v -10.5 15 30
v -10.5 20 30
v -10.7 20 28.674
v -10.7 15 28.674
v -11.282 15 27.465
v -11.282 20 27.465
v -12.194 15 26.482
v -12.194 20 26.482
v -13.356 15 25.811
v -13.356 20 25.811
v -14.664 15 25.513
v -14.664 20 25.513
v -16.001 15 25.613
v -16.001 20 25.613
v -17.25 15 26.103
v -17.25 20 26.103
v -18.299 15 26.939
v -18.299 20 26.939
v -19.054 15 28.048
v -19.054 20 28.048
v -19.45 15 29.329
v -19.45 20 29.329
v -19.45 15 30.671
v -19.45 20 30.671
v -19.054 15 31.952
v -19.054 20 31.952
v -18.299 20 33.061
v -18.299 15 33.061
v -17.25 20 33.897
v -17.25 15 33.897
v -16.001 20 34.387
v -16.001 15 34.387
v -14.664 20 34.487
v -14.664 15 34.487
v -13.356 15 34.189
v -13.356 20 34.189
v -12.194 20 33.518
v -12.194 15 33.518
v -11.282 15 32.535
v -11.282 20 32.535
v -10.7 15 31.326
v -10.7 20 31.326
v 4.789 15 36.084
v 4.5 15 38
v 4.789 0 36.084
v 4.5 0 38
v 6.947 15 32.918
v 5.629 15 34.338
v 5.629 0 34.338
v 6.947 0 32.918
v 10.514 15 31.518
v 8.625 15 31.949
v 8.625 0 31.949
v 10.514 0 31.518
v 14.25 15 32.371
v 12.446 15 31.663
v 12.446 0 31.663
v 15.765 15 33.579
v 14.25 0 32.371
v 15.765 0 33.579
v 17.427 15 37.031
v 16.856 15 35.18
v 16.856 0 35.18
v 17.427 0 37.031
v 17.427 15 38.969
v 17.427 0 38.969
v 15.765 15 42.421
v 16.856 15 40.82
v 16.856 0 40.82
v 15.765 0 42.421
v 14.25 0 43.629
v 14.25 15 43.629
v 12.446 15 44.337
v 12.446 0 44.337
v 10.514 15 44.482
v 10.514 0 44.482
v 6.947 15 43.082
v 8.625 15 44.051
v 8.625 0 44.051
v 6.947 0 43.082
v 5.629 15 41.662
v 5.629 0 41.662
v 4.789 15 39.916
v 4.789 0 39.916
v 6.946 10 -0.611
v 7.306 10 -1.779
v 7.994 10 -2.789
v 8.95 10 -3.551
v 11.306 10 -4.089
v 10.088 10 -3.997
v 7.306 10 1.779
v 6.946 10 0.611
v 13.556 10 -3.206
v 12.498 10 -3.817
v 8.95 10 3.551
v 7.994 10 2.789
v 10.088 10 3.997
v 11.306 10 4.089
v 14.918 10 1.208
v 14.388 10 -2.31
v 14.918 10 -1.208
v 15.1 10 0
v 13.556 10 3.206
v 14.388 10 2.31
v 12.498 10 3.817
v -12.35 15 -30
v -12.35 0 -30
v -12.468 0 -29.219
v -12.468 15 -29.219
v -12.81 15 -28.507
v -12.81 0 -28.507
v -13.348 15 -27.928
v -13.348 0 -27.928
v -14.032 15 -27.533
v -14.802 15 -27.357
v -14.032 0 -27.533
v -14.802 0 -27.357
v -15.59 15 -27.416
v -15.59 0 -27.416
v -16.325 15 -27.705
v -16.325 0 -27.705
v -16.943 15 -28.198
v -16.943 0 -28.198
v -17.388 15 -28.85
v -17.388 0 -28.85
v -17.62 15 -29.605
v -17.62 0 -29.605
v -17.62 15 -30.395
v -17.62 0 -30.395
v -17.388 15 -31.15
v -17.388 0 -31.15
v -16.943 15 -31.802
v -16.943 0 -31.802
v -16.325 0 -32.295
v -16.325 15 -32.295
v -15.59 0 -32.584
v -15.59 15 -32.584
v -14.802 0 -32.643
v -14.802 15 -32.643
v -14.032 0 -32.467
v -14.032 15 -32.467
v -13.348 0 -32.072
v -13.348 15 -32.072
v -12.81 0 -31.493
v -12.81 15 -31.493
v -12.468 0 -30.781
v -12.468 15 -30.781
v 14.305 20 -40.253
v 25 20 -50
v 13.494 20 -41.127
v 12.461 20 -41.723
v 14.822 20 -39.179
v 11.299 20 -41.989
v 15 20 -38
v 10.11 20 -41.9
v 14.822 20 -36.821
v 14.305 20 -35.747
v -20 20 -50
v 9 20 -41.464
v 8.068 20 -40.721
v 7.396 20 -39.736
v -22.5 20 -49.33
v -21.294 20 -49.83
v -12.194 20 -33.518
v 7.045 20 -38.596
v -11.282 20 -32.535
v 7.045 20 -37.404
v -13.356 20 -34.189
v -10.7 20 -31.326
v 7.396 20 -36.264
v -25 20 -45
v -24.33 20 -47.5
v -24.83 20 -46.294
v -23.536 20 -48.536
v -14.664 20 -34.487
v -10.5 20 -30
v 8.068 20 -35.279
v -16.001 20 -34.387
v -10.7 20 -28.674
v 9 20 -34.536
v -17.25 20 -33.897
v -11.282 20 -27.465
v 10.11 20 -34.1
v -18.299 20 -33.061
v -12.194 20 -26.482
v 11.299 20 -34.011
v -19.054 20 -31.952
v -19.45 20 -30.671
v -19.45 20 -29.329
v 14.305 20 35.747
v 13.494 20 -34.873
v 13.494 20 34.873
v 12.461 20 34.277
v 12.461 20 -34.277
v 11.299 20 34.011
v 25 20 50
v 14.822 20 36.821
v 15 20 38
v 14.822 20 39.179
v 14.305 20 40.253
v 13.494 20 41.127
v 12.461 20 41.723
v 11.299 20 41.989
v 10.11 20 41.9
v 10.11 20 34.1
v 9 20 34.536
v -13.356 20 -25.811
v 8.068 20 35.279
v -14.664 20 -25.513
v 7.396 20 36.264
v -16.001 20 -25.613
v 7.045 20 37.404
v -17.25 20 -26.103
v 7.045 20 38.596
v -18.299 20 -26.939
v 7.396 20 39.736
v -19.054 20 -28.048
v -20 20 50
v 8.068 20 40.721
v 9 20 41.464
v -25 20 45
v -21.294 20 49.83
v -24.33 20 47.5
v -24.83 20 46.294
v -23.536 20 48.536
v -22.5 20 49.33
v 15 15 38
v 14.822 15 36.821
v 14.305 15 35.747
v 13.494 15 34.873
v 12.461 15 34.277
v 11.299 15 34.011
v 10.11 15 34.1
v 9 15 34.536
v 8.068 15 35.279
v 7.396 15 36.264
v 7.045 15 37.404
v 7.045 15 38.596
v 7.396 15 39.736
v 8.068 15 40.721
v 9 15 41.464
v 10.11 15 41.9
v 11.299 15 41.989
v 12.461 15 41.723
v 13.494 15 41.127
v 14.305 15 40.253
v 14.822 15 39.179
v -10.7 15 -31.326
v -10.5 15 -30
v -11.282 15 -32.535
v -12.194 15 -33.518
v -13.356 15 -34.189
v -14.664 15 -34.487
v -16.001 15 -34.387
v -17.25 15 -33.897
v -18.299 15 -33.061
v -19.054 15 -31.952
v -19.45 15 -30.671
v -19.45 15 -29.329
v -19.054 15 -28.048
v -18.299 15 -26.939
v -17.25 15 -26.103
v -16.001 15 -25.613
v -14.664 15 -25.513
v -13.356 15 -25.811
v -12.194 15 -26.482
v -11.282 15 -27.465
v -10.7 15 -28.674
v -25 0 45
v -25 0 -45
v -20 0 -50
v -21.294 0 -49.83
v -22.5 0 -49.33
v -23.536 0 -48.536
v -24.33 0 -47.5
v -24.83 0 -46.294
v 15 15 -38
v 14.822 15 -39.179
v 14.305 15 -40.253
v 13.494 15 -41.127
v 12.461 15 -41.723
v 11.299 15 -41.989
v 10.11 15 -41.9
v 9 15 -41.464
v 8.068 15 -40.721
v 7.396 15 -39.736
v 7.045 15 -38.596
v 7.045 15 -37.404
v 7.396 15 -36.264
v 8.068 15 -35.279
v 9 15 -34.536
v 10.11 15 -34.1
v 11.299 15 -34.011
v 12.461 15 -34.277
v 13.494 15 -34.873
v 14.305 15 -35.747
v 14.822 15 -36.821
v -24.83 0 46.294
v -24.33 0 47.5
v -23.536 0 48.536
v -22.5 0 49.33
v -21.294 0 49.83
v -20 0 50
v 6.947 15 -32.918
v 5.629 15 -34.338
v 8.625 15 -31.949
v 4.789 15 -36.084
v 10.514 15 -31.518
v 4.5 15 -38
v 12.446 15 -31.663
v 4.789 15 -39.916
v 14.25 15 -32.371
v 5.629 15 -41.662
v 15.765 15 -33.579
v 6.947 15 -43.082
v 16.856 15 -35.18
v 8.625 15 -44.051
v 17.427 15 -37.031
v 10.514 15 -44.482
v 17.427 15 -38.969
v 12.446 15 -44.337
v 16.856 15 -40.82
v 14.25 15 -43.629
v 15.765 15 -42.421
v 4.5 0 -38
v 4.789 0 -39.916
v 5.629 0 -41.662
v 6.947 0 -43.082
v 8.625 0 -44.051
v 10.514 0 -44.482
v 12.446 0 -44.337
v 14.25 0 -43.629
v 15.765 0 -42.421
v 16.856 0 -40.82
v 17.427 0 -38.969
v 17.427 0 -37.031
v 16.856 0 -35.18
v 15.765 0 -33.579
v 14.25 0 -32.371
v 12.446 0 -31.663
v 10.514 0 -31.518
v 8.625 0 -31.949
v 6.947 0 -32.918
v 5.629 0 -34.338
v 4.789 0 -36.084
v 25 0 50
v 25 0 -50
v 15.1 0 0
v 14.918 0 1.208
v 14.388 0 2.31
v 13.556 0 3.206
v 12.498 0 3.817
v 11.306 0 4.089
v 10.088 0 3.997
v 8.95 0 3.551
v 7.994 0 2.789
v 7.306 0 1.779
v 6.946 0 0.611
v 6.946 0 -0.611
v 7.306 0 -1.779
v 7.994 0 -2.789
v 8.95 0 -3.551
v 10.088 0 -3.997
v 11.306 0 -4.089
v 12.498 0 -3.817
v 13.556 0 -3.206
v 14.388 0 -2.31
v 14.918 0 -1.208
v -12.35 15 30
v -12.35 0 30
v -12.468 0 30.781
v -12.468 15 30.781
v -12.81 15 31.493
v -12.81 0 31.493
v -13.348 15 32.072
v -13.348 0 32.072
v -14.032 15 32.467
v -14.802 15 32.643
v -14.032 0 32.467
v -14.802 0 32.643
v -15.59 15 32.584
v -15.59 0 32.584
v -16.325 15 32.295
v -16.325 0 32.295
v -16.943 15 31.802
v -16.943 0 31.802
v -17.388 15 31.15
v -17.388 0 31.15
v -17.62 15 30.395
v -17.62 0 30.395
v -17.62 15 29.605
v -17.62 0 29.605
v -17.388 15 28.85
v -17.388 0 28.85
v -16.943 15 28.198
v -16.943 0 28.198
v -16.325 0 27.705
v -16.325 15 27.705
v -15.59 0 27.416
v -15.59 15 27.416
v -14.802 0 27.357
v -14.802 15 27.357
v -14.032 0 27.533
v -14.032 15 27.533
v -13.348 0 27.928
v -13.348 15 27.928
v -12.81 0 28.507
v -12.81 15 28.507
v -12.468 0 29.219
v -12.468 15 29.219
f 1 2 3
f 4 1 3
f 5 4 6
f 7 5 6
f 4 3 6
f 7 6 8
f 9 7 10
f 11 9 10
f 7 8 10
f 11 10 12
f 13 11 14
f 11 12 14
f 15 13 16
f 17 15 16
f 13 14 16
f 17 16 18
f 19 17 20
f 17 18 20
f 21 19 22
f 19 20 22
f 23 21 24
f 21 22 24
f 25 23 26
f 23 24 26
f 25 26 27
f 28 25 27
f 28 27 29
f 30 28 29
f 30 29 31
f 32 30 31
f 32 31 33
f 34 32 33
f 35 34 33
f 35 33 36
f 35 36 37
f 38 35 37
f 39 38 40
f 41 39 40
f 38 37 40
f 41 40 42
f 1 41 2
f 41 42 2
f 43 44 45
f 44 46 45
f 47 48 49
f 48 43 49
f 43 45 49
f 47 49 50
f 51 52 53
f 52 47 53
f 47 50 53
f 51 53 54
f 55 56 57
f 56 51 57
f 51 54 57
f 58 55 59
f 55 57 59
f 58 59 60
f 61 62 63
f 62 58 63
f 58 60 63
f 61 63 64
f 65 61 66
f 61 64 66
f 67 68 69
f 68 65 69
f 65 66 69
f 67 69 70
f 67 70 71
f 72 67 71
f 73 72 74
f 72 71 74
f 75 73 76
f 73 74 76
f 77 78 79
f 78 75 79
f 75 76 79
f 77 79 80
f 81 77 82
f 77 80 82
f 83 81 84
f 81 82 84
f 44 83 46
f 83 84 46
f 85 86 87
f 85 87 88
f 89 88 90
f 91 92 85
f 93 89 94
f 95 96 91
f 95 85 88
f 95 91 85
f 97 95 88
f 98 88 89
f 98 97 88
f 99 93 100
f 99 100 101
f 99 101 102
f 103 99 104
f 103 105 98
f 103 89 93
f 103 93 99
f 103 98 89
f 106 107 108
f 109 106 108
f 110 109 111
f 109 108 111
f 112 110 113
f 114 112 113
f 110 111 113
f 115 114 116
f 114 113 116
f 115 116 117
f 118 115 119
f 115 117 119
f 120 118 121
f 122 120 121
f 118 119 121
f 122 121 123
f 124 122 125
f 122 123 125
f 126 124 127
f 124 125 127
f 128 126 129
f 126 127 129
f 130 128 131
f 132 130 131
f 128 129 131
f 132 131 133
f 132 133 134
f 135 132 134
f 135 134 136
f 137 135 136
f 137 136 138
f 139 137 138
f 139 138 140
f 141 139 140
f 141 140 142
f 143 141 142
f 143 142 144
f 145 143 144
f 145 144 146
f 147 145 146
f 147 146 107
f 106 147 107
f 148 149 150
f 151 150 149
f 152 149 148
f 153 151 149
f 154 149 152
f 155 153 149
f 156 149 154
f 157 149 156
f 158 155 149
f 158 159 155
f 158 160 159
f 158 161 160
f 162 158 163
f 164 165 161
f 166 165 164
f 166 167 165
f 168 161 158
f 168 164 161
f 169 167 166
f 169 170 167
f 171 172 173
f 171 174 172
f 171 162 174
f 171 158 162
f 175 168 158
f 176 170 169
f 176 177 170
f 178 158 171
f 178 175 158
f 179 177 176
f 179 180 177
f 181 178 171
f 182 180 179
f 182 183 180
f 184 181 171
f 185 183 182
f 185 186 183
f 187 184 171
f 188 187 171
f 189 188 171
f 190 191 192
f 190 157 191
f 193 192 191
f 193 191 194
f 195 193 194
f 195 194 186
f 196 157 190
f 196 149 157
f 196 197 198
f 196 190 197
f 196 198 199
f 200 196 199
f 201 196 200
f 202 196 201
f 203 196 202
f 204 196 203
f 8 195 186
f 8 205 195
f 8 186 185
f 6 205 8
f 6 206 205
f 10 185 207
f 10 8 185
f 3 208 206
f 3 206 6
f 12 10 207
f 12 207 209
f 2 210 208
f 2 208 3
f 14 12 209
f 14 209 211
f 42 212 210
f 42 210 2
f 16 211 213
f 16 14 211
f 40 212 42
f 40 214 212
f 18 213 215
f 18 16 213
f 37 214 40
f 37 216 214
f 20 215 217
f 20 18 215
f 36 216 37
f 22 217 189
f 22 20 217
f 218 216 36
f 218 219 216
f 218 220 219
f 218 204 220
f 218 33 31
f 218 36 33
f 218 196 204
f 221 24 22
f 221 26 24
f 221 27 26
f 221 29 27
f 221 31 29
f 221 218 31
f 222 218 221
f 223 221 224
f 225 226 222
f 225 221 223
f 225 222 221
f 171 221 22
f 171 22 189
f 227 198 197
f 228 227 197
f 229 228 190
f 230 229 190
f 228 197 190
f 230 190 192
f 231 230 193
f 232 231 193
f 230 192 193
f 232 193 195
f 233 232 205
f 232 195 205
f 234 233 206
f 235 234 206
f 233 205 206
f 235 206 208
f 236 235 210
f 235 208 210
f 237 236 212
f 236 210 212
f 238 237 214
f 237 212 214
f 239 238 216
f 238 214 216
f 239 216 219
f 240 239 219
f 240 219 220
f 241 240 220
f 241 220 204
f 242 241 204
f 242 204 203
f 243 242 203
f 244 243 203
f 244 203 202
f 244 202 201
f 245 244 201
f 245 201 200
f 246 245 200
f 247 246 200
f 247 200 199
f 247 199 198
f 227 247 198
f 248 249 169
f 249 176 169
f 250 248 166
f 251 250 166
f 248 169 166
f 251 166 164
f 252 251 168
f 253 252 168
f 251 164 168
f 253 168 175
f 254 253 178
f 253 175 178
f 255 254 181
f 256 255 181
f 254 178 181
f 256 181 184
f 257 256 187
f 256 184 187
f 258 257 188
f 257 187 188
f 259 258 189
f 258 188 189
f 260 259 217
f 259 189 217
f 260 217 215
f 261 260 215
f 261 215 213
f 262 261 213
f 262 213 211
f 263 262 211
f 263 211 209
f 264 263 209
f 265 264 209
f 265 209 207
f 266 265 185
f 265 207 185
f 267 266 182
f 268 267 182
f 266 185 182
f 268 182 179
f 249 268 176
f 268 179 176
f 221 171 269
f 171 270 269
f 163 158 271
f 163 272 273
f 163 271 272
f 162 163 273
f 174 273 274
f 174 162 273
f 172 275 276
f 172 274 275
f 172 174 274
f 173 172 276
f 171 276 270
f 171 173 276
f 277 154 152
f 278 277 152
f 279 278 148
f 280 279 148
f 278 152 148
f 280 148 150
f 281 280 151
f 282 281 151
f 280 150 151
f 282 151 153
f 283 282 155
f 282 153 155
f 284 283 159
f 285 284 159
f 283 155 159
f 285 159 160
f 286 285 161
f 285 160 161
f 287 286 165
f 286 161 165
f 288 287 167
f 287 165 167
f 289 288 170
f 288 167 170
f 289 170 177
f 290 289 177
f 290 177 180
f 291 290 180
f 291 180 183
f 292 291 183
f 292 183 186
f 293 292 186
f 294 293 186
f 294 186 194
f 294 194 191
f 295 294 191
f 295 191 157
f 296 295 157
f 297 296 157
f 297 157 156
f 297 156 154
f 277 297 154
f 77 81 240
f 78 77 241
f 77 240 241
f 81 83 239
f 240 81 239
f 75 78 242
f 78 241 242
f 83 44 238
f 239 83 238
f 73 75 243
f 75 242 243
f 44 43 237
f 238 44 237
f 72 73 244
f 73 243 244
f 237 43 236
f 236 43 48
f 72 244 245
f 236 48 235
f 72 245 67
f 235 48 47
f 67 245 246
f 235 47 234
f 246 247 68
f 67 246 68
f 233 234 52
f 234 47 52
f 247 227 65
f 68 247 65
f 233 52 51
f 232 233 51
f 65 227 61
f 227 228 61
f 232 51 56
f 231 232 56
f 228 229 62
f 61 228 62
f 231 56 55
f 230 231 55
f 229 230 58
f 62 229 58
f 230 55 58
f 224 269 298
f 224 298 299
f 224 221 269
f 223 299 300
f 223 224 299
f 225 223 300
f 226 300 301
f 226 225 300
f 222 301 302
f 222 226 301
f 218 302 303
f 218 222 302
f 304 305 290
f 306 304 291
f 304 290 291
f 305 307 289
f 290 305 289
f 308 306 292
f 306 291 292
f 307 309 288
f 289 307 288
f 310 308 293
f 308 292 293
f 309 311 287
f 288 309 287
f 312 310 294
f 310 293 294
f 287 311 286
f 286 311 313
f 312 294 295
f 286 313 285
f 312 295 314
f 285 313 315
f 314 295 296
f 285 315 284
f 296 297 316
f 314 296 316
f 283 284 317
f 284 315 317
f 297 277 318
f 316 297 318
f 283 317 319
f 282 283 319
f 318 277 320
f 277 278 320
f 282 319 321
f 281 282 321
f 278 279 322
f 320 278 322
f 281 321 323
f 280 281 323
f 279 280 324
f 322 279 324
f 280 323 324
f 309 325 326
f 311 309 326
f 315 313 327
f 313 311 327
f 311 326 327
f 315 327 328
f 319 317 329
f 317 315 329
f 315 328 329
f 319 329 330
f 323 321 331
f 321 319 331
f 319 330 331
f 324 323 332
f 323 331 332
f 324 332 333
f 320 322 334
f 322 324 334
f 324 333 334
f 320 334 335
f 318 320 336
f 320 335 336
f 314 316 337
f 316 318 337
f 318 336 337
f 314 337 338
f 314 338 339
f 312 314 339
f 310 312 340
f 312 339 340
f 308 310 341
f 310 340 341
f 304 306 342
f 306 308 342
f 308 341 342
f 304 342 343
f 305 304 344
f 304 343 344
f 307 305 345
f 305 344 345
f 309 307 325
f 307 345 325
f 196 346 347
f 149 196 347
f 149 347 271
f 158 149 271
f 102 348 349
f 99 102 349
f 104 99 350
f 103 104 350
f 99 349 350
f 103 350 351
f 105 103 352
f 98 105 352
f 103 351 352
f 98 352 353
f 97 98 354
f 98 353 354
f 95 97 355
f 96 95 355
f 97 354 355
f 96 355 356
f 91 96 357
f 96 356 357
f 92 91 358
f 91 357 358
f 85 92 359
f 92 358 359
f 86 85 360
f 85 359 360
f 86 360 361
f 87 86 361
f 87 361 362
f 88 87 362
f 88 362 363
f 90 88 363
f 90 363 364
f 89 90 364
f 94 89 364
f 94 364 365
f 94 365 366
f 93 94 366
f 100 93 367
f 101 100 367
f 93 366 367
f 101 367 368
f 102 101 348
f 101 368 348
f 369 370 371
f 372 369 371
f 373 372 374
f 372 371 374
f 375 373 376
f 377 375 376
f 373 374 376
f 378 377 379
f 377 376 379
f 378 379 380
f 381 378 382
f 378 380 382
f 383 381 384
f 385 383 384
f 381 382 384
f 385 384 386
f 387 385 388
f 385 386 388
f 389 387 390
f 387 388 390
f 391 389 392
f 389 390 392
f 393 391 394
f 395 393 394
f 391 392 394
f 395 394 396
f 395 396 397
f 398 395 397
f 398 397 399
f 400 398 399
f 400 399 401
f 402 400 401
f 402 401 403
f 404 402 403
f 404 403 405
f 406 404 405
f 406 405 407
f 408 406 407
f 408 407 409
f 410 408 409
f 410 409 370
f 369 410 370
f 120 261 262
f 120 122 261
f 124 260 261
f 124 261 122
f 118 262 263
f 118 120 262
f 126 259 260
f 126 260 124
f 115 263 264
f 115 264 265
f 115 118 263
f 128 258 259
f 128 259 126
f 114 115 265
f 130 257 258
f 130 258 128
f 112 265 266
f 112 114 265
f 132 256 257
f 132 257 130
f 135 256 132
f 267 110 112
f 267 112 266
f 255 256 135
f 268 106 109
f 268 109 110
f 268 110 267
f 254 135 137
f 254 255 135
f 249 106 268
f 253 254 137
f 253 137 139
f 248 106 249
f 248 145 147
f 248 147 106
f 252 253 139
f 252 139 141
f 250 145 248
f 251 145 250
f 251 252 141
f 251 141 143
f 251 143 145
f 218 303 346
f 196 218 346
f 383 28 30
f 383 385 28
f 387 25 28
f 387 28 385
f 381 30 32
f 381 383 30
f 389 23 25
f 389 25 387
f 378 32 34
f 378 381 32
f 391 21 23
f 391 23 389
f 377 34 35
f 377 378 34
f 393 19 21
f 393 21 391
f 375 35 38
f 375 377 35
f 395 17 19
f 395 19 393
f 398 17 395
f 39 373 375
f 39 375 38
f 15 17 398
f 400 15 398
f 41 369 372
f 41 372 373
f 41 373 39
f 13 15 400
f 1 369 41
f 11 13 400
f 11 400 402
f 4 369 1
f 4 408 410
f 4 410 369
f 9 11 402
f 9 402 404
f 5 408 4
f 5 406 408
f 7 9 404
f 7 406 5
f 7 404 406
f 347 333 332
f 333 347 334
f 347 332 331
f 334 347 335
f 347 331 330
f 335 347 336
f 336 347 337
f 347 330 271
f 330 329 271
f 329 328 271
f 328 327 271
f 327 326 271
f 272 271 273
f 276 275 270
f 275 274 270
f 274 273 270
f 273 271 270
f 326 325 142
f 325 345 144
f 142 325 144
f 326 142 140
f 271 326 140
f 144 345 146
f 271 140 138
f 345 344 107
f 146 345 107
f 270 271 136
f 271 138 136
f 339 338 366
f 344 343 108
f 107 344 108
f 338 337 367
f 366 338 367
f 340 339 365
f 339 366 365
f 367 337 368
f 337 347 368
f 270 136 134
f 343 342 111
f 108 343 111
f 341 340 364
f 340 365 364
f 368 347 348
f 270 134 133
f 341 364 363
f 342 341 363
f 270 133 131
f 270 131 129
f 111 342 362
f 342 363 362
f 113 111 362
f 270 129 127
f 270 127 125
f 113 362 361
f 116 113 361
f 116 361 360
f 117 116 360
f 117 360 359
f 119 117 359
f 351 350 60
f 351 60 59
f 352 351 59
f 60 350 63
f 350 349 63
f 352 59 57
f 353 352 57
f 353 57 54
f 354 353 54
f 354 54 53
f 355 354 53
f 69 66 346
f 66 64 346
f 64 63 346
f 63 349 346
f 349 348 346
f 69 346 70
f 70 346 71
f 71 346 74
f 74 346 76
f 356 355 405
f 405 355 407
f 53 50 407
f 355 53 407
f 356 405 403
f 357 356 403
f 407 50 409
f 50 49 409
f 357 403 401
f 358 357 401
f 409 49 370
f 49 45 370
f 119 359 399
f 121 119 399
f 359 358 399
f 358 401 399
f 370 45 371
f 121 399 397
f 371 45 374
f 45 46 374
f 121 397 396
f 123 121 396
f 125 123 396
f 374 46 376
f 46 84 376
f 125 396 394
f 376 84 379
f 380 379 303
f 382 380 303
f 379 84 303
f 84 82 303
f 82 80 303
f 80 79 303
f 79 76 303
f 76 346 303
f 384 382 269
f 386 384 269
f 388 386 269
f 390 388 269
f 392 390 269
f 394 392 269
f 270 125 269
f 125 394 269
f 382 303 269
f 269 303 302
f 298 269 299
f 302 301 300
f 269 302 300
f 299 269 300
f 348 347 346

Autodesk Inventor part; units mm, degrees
ref_plane "YZ Plane" through (0, 0, 0) normal (1, 0, 0) x (0, 1, 0)
ref_plane "XZ Plane" through (0, 0, 0) normal (0, 1, 0) x (-1, 0, 0)
ref_plane "XY Plane" through (0, 0, 0) normal (0, 0, 1) x (1, 0, 0)
sketch "Sketch1" plane through (0, 0, 0) normal (0, 1, 0) x (-1, 0, 0)
  line L0 (25, 50) -> (-25, 50)
  line L1 (-25, 50) -> (-25, -50)
  line L2 (-25, -50) -> (25, -50)
  line L3 (25, -50) -> (25, 50)
  line L4 (25, 50) -> (-25, -50) construction
  line L5 (-25, 50) -> (25, -50) construction
  circle A0 centre (-11, 38) radius 6.5
  circle A1 centre (-11, -38) radius 6.5
  point P0 (0, 0)
  dimension "d0" = 13
  dimension "d1" = 100
  dimension "d2" = 50
  dimension "d3" = 14
  dimension "d4" = 12
  dimension "d5" = 12
extrude "Extrusion1" add sketch "Sketch1" along normal blind 20
sketch "Sketch2" plane through (0, 20, 0) normal (0, 1, 0) x (1, 0, 0)
  circle A0 centre (11, -38) radius 6.5 projected
  circle A1 centre (11, -38) radius 4
  circle A2 centre (11, 38) radius 6.5 projected
  circle A3 centre (11, 38) radius 4
  point P0 (0, 0)
  dimension "d8" = 8
  dimension "d9" = 8
extrude "Extrusion2" add sketch "Sketch2" against normal blind 5
sketch "Sketch3" plane through (0, 0, 0) normal (0, -1, 0) x (1, 0, 0)
  circle A0 centre (-15, -30) radius 2.65
  circle A1 centre (-15, 30) radius 2.65
  line L0 (-25, -50) -> (-25, 50) projected
  line L1 (25, -50) -> (-25, -50) projected
  line L2 (-25, 50) -> (25, 50) projected
  point P0 (0, 0)
  dimension "d12" = 5.3
  dimension "d13" = 10
  dimension "d14" = 20
  dimension "d15" = 20
  dimension "d16" = 10
extrude "Extrusion3" cut sketch "Sketch3" against normal through all
fillet "Fillet1" radius 5 2 edges at (-25, 10, -50) (-25, 10, 50)
sketch "Sketch4" plane through (0, 20, 0) normal (0, 1, 0) x (1, 0, 0)
  circle A0 centre (-15, -30) radius 2.65 projected
  line L0 (-19.734, -29.95) -> (-17.3237, -25.8752)
  line L1 (-17.3237, -25.8752) -> (-12.5897, -25.9252)
  line L2 (-12.5897, -25.9252) -> (-10.266, -30.05)
  line L3 (-10.266, -30.05) -> (-12.6763, -34.1248)
  line L4 (-12.6763, -34.1248) -> (-17.4103, -34.0748)
  line L5 (-17.4103, -34.0748) -> (-19.734, -29.95)
  circle A1 centre (-15, -30) radius 4.1
  circle A2 centre (-15, 30) radius 2.65 projected
  line L6 (-19.7332, 30.1003) -> (-17.2797, 34.1492)
  line L7 (-17.2797, 34.1492) -> (-12.5465, 34.0489)
  line L8 (-12.5465, 34.0489) -> (-10.2668, 29.8997)
  line L9 (-10.2668, 29.8997) -> (-12.7203, 25.8508)
  line L10 (-12.7203, 25.8508) -> (-17.4535, 25.9511)
  line L11 (-17.4535, 25.9511) -> (-19.7332, 30.1003)
  circle A3 centre (-15, 30) radius 4.1
  point P0 (0, 0)
  dimension "d20" = 8.2
extrude "Extrusion4" [suppressed]
sketch "Sketch5" plane through (25, 0, 50) normal (1, 0, 0) x (0, 0, -1)
  line L0 (100, 0) -> (100, 20) projected
  line L1 (100, 20) -> (120, 20)
  line L2 (120, 20) -> (120, 0)
  line L3 (120, 0) -> (100, 0)
  line L4 (100, 0) -> (100, 20)
  circle A0 centre (110, 10) radius 2.75
  line L5 (0, 0) -> (0, 20) projected
  line L6 (0, 0) -> (-20, 0)
  line L7 (-20, 0) -> (-20, 20)
  line L8 (-20, 20) -> (0, 20)
  line L9 (0, 20) -> (0, 0)
  circle A1 centre (-10, 10) radius 2.75
  point P0 (50, 0)
  point P1 (0, 20)
  dimension "d23" = 20
  dimension "d24" = 5.5
  dimension "d27" = 20
  dimension "d28" = 20
  dimension "d29" = 20
  dimension "d30" = 5.5
extrude "Extrusion5" [suppressed]
chamfer "Chamfer1" [suppressed]
sketch "Sketch6" plane through (5, 0, 50) normal (-1, 0, 0) x (0, 0, 1)
  arc A0 (-110, 12.75) -> (-110, 7.25) centre (-110, 10) ccw projected
  circle A1 centre (-110, 10) radius 4.75
  circle A2 centre (10, 10) radius 2.75 projected
  circle A3 centre (10, 10) radius 4.75
  point P0 (-50, 0)
  dimension "d34" = 9.5
extrude "Extrusion6" [suppressed]
fillet "Fillet2" [suppressed]
sketch "Sketch7" plane through (0, 20, 0) normal (0, 1, 0) x (1, 0, 0)
  circle A0 centre (-15, 30) radius 2.65 projected
  circle A1 centre (-15, 30) radius 4.5
  circle A2 centre (-15, -30) radius 2.65 projected
  circle A3 centre (-15, -30) radius 4.5
  point P0 (0, 0)
  dimension "d38" = 9
extrude "Extrusion7" cut sketch "Sketch7" against normal blind 5 contours A0 | A1 | A2 | A3
sketch "Sketch8" plane through (0, 0, 0) normal (0, -1, 0) x (1, 0, 0)
  circle A0 centre (11, 0) radius 4.1
  circle A1 centre (11, -38) radius 6.5 projected
  line L0 (25, 50) -> (25, -50) projected
  line L1 (-20, 50) -> (25, 50) projected
  arc A2 (-20, 50) -> (-25, 45) centre (-20, 45) ccw projected
  line L2 (-25, -45) -> (-25, 45) projected
  arc A3 (-25, -45) -> (-20, -50) centre (-20, -45) ccw projected
  line L3 (25, -50) -> (-20, -50) projected
  circle A4 centre (-15, 30) radius 2.65 projected
  circle A5 centre (-15, -30) radius 2.65 projected
  circle A6 centre (11, 38) radius 6.5 projected
  circle A7 centre (11, -38) radius 6.5 projected
  point P0 (0, 0)
  dimension "d41" = 8.2
extrude "Extrusion8" cut sketch "Sketch8" against normal blind 10 contours A0
properties part number "Stationaryjaw"
